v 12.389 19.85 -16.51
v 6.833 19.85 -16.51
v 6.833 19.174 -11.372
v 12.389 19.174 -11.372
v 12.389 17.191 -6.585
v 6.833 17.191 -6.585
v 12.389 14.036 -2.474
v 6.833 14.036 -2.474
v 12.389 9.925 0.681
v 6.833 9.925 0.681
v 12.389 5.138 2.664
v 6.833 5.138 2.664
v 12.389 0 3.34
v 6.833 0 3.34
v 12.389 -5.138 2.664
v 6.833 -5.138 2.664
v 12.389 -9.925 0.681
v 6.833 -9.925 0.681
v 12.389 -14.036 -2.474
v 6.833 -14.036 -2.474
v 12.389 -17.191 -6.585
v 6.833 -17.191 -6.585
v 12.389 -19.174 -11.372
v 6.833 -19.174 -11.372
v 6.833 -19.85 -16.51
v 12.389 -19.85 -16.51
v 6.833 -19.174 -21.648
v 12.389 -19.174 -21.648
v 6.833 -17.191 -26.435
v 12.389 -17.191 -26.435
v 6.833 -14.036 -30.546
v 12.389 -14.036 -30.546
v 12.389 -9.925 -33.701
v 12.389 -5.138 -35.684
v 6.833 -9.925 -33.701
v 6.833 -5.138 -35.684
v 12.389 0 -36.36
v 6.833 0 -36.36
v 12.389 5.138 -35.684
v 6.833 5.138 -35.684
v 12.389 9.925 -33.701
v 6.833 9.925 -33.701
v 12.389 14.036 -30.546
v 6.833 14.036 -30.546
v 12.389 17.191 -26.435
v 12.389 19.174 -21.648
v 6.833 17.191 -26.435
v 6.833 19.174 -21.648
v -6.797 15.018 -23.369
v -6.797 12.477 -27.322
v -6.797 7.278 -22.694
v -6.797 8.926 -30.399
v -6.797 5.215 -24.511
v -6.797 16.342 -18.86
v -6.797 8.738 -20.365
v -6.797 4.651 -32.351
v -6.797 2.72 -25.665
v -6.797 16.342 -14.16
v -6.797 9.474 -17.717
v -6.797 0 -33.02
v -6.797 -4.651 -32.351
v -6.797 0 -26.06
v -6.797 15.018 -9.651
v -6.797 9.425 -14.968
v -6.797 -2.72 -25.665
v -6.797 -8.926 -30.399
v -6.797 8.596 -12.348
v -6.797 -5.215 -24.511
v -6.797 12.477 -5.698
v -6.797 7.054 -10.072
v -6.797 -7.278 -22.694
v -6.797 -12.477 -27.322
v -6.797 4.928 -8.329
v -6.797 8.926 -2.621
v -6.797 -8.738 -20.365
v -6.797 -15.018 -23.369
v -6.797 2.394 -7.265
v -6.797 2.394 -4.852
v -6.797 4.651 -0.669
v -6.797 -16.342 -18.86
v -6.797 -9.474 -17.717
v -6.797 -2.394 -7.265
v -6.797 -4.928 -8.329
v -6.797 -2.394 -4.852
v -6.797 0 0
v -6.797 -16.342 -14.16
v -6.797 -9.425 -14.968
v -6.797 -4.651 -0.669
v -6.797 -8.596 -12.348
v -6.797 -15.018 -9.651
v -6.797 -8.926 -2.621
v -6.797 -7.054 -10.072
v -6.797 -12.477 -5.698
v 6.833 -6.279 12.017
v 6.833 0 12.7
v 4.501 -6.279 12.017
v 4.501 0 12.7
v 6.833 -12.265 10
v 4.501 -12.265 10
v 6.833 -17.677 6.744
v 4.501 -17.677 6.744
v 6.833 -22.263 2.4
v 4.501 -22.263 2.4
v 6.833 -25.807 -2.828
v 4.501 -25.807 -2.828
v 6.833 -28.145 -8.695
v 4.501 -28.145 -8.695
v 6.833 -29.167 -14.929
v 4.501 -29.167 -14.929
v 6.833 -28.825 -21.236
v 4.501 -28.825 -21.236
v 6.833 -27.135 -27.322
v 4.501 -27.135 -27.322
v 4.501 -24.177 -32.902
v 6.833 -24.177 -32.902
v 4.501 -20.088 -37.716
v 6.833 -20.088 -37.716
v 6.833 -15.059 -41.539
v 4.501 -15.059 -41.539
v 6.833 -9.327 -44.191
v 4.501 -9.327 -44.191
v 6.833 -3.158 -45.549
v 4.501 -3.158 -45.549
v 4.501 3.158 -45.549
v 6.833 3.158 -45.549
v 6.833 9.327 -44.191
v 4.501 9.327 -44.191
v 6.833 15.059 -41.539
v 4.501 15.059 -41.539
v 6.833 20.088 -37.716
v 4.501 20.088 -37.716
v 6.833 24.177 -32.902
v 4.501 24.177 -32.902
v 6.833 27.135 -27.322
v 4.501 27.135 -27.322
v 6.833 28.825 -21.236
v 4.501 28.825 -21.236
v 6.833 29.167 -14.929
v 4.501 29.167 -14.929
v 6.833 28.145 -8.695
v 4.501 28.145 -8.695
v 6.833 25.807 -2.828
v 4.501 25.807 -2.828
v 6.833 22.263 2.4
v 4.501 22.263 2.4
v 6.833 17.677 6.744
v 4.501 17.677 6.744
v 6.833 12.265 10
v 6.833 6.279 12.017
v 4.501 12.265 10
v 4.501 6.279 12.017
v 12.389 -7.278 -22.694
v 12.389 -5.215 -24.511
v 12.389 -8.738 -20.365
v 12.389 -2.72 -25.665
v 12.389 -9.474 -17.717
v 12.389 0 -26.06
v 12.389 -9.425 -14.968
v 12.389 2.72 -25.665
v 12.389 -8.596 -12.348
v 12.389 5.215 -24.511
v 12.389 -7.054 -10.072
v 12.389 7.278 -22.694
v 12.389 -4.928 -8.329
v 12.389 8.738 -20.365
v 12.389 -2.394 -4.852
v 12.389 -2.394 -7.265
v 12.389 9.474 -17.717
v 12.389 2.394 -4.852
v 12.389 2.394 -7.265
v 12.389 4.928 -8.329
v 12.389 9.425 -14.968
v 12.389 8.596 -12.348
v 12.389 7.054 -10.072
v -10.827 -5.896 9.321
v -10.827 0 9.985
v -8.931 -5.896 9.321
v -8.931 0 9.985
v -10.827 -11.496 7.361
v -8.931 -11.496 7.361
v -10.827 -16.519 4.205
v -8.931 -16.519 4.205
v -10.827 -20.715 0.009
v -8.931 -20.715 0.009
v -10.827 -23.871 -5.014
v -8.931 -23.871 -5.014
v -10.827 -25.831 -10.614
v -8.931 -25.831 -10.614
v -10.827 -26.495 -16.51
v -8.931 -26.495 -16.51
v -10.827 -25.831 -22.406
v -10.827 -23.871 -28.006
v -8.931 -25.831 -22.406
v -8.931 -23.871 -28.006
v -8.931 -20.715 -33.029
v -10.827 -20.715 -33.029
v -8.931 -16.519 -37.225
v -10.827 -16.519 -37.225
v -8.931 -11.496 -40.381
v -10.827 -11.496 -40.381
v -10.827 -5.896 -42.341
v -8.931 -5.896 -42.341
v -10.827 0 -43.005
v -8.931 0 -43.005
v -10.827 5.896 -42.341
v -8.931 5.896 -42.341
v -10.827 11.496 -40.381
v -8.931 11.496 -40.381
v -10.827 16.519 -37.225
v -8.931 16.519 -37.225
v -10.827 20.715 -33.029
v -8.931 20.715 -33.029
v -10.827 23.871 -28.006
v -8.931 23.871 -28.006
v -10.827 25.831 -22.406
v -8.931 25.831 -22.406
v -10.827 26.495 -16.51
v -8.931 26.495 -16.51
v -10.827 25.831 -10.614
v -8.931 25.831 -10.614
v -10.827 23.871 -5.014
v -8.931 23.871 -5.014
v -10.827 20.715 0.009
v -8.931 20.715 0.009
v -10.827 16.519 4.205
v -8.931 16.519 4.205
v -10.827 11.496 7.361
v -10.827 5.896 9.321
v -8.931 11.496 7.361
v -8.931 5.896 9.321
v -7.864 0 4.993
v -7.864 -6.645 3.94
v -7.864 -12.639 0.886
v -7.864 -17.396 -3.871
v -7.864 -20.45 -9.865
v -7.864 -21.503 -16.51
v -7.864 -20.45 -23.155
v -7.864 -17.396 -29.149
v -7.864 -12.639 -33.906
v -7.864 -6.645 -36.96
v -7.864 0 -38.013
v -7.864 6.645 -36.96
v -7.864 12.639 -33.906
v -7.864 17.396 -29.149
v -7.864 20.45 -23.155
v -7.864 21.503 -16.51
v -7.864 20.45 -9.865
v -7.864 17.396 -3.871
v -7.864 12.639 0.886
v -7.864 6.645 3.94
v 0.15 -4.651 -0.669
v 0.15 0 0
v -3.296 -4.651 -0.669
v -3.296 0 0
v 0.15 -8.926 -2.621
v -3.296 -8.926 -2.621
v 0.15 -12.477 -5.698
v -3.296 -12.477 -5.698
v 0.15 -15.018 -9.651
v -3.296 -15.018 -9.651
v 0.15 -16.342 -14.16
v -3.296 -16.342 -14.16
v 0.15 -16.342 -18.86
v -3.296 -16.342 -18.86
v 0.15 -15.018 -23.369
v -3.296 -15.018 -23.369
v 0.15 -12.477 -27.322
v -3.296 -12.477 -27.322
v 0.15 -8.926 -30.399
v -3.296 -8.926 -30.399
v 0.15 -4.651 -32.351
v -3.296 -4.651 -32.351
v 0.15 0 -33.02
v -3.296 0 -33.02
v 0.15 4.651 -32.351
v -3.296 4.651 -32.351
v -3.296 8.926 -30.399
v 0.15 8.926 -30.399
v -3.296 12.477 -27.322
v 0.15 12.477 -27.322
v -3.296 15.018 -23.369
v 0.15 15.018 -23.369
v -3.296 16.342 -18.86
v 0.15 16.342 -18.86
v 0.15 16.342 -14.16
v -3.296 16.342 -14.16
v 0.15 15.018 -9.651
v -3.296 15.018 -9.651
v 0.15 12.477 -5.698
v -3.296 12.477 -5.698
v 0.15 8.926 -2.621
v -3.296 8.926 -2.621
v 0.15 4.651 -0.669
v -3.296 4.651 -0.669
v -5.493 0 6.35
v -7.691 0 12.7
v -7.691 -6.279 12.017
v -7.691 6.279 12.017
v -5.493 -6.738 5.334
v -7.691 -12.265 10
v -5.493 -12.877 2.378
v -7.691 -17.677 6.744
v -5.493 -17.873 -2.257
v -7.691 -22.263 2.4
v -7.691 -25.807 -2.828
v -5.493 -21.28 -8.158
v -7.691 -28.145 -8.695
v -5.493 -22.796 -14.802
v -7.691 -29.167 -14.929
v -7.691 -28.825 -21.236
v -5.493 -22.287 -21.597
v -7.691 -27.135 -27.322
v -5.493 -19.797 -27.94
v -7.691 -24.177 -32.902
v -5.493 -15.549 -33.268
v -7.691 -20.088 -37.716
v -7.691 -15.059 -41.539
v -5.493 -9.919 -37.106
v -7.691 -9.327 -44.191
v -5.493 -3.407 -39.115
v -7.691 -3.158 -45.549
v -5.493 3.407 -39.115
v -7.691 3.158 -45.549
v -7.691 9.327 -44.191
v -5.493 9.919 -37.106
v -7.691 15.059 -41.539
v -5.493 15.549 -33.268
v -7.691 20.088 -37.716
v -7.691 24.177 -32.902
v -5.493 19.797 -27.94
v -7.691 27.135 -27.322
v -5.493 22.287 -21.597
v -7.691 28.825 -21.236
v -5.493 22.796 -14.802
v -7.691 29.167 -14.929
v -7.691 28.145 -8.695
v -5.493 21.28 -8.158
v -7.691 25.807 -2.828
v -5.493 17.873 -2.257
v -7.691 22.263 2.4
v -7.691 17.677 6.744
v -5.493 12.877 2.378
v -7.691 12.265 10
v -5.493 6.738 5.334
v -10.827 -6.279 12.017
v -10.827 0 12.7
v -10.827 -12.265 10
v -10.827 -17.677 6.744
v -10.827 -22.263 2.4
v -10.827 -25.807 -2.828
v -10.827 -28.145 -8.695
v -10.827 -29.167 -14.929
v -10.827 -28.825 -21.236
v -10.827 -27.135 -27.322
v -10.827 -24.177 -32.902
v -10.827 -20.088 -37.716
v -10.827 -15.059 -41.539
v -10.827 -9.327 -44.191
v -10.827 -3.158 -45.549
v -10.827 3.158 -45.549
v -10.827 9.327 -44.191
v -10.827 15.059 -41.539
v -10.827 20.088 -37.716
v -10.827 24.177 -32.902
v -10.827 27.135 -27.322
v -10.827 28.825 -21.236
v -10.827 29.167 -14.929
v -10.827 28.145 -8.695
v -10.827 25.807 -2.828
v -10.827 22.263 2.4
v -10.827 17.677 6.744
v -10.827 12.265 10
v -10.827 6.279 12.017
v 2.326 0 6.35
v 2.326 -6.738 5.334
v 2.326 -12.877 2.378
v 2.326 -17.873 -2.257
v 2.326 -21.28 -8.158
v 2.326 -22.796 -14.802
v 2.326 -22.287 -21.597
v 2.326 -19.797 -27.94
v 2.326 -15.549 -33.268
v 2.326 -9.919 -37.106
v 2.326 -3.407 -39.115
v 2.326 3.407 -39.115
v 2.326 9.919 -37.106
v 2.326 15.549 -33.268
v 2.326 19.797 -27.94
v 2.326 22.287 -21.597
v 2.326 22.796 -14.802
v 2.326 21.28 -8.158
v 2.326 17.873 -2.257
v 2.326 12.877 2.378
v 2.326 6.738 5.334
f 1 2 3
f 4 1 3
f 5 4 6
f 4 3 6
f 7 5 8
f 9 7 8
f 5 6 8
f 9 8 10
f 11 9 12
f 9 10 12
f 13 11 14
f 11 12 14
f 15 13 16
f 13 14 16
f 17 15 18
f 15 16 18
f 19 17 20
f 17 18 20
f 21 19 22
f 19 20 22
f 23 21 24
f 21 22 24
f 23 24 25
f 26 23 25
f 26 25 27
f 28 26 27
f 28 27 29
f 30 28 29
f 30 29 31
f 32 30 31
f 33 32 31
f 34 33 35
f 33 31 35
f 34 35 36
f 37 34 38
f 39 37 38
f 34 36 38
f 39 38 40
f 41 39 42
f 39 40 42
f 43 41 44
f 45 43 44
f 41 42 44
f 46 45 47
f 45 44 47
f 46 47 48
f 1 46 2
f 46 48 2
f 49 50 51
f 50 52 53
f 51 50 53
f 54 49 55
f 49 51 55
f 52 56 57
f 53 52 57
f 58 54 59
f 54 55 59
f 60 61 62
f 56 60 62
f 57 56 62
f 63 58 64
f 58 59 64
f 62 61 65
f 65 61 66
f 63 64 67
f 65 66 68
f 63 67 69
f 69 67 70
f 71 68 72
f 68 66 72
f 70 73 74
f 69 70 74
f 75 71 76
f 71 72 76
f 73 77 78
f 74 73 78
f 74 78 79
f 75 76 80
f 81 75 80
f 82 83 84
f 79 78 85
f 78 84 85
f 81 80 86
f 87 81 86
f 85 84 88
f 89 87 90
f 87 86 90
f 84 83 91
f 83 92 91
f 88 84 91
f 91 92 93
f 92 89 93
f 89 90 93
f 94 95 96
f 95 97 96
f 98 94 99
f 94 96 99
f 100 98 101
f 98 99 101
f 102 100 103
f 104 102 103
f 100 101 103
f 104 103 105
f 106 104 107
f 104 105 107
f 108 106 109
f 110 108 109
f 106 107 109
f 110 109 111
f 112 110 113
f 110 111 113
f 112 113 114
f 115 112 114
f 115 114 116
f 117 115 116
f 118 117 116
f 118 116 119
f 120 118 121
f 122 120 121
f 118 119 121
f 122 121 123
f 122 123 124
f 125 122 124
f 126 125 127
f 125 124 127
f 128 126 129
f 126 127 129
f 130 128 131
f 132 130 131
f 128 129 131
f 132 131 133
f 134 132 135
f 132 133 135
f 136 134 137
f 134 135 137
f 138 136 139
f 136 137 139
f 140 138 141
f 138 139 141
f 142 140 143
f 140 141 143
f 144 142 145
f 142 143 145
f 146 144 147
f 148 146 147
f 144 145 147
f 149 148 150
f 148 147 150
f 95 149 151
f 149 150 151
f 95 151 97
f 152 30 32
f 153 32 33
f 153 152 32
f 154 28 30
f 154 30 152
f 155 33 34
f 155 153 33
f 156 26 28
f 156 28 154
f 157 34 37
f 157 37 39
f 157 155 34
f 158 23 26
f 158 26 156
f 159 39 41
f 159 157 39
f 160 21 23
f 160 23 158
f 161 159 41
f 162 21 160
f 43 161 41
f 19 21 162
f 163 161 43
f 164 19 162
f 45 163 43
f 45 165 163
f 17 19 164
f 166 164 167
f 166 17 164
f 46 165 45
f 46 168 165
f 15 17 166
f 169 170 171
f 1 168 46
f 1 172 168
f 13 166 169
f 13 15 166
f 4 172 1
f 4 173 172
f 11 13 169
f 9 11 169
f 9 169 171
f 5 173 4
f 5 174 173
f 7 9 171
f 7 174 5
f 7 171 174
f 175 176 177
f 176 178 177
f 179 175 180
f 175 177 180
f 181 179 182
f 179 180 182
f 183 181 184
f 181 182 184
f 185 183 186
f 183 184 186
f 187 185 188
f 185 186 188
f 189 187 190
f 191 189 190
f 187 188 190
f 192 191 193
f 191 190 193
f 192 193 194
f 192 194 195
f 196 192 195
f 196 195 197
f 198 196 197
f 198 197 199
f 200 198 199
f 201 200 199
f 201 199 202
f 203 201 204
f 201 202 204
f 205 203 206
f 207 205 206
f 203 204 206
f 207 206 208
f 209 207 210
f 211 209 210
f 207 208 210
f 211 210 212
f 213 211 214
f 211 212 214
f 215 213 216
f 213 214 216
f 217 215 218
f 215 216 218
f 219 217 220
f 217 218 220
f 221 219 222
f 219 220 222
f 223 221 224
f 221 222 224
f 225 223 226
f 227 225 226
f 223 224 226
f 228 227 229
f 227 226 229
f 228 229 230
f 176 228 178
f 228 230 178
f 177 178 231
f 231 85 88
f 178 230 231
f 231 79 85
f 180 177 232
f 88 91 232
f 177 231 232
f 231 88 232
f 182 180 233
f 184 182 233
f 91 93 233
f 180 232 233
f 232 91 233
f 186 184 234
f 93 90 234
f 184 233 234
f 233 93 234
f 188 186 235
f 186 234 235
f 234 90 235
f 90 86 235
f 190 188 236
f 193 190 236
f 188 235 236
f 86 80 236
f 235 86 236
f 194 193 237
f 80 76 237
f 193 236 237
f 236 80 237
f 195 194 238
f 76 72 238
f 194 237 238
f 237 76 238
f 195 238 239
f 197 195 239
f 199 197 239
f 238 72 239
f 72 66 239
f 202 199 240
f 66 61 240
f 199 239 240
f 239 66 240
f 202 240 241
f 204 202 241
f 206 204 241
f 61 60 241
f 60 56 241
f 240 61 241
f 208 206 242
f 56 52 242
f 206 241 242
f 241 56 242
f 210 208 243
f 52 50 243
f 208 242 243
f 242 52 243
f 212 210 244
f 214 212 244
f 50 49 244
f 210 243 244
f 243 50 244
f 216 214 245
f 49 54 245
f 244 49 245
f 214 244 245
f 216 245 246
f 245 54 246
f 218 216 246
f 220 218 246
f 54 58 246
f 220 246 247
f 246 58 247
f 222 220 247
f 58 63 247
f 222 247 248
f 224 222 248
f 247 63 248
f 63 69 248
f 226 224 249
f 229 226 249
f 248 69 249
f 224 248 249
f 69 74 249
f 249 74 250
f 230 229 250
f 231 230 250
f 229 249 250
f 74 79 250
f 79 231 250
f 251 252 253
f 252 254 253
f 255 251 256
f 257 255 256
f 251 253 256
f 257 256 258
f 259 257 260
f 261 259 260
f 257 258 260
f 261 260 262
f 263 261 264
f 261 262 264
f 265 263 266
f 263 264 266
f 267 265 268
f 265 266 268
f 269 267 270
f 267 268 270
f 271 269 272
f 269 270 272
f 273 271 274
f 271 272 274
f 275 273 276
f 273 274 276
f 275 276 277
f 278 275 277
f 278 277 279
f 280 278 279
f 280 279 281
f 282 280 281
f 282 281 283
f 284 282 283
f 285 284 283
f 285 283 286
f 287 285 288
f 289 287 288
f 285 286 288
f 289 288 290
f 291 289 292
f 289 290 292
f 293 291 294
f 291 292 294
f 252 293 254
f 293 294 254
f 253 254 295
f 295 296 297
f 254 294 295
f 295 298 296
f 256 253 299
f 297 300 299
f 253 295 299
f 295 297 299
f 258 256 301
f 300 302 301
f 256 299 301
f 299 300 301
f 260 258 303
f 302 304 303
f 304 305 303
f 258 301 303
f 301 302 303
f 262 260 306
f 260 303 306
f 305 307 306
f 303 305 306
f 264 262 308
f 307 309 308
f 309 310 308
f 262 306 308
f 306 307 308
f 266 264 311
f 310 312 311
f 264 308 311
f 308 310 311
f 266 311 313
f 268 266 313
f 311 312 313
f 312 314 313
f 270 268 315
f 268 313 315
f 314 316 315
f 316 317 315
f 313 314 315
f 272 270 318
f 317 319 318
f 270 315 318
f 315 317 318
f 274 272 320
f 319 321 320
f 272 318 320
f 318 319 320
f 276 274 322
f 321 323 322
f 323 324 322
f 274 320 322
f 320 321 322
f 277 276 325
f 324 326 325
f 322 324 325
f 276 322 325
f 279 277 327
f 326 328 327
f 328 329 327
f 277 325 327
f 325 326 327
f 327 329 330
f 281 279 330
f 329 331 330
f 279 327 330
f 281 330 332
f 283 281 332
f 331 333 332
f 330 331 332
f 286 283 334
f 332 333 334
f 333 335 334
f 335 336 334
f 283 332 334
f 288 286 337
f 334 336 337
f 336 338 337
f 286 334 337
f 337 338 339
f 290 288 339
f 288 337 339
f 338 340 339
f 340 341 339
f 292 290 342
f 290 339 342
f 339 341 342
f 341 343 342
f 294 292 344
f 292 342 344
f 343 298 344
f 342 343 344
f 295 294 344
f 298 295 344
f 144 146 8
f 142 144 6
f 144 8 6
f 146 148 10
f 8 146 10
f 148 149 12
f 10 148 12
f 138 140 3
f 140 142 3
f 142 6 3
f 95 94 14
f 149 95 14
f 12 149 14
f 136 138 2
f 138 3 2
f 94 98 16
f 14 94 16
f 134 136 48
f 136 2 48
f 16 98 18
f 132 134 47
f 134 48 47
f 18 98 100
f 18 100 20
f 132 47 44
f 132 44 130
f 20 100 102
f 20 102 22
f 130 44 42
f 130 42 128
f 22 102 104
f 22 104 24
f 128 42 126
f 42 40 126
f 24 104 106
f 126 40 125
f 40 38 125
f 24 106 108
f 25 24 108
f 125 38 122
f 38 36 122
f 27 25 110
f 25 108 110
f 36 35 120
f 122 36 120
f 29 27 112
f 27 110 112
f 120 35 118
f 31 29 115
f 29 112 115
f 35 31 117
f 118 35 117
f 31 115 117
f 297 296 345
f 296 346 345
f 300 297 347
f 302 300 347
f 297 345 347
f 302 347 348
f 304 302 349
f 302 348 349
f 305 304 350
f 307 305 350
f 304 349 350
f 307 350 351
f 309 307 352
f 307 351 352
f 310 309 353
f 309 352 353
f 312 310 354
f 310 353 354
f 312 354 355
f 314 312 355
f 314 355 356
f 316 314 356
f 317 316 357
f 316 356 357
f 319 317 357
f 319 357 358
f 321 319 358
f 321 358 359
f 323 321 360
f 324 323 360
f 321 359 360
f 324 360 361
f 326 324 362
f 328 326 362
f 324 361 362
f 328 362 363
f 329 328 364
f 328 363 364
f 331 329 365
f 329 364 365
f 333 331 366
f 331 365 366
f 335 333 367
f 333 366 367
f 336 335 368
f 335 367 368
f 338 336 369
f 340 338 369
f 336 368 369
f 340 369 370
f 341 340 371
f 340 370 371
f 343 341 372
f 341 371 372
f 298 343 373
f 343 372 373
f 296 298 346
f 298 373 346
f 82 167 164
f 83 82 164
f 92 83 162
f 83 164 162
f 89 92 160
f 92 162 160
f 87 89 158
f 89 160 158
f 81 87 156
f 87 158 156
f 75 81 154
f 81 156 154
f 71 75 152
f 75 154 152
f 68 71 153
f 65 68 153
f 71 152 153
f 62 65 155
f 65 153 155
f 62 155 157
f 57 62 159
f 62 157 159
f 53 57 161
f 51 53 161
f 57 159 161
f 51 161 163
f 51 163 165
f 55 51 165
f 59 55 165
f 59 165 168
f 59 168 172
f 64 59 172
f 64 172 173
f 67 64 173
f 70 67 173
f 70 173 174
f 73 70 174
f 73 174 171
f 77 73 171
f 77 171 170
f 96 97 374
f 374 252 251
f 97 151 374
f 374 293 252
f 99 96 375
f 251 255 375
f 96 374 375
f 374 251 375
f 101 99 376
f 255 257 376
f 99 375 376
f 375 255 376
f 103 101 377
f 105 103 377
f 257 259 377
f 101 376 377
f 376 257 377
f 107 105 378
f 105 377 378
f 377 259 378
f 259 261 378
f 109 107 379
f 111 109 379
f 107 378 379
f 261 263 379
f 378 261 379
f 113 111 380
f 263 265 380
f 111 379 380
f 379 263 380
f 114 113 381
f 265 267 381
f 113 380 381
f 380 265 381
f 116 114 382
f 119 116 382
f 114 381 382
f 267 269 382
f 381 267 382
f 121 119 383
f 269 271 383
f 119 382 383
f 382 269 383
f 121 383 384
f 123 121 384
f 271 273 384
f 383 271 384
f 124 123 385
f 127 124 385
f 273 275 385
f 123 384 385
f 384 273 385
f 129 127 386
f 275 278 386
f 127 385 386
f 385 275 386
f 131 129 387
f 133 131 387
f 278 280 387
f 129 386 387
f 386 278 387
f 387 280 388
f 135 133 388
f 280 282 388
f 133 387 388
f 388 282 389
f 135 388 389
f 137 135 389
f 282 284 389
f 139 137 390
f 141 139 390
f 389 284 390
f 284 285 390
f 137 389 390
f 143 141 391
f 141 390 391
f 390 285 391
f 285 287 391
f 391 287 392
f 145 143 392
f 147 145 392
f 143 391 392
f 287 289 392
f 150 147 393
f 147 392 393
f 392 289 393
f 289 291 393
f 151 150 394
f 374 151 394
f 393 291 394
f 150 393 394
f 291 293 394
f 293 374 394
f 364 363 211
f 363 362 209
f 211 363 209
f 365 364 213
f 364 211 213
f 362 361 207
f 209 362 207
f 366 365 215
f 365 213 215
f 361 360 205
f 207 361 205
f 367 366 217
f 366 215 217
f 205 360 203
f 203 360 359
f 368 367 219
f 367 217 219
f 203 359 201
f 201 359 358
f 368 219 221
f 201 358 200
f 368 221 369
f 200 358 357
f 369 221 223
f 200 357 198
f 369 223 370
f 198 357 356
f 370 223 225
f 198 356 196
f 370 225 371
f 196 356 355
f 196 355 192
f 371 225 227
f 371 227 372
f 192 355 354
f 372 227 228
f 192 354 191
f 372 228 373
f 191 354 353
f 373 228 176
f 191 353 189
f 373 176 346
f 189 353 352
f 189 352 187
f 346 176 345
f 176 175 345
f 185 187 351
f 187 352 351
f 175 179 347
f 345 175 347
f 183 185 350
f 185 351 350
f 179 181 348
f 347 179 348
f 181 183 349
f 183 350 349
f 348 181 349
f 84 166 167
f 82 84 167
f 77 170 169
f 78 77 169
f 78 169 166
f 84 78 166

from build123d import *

# Parameters (mm, degrees)
F2_R     = 19.8501
F3_DEPTH = 5.55625
F5_DEPTH = 254


with BuildPart() as f1:
    # F0 (on Front) → F1 (revolve)
    with BuildSketch(Plane.XZ):
        Polygon((0.150096, 0), (0, 0), (-3.29596, 0), (-7.690672, 12.7), (-10.826997, 12.7), (-10.826997, 9.985023), (-8.93062, 9.985023), (-6.797195, 0), (-6.797195, -4.826381), (-6.797195, -16.51), (6.833015, -16.51), (6.833015, 12.7), (4.501328, 12.7), align=None)
    revolve(axis=Axis((0.01791, 0, -16.51), (1, 0, 0)))

    # F2 (on face) → F3 (join)
    with BuildSketch(Plane.YZ.offset(6.833015)):
        with Locations((0, -16.51)):
            Circle(F2_R)
    extrude(amount=F3_DEPTH)

    # F4 (on face) → F5 (cut)
    with BuildSketch(Plane.YZ.offset(12.389265)):
        with BuildLine():
            Line((-2.39395, -4.851507), (-2.39395, -7.264507))
            ThreePointArc((-2.39395, -7.264507), (0, -26.0604), (2.39395, -7.264507))
            Line((2.39395, -7.264507), (2.39395, -4.851507))
            Line((2.39395, -4.851507), (0, -4.851507))
            Line((0, -4.851507), (-2.39395, -4.851507))
        make_face()
    extrude(amount=-F5_DEPTH, mode=Mode.SUBTRACT)


solid = f1.part
